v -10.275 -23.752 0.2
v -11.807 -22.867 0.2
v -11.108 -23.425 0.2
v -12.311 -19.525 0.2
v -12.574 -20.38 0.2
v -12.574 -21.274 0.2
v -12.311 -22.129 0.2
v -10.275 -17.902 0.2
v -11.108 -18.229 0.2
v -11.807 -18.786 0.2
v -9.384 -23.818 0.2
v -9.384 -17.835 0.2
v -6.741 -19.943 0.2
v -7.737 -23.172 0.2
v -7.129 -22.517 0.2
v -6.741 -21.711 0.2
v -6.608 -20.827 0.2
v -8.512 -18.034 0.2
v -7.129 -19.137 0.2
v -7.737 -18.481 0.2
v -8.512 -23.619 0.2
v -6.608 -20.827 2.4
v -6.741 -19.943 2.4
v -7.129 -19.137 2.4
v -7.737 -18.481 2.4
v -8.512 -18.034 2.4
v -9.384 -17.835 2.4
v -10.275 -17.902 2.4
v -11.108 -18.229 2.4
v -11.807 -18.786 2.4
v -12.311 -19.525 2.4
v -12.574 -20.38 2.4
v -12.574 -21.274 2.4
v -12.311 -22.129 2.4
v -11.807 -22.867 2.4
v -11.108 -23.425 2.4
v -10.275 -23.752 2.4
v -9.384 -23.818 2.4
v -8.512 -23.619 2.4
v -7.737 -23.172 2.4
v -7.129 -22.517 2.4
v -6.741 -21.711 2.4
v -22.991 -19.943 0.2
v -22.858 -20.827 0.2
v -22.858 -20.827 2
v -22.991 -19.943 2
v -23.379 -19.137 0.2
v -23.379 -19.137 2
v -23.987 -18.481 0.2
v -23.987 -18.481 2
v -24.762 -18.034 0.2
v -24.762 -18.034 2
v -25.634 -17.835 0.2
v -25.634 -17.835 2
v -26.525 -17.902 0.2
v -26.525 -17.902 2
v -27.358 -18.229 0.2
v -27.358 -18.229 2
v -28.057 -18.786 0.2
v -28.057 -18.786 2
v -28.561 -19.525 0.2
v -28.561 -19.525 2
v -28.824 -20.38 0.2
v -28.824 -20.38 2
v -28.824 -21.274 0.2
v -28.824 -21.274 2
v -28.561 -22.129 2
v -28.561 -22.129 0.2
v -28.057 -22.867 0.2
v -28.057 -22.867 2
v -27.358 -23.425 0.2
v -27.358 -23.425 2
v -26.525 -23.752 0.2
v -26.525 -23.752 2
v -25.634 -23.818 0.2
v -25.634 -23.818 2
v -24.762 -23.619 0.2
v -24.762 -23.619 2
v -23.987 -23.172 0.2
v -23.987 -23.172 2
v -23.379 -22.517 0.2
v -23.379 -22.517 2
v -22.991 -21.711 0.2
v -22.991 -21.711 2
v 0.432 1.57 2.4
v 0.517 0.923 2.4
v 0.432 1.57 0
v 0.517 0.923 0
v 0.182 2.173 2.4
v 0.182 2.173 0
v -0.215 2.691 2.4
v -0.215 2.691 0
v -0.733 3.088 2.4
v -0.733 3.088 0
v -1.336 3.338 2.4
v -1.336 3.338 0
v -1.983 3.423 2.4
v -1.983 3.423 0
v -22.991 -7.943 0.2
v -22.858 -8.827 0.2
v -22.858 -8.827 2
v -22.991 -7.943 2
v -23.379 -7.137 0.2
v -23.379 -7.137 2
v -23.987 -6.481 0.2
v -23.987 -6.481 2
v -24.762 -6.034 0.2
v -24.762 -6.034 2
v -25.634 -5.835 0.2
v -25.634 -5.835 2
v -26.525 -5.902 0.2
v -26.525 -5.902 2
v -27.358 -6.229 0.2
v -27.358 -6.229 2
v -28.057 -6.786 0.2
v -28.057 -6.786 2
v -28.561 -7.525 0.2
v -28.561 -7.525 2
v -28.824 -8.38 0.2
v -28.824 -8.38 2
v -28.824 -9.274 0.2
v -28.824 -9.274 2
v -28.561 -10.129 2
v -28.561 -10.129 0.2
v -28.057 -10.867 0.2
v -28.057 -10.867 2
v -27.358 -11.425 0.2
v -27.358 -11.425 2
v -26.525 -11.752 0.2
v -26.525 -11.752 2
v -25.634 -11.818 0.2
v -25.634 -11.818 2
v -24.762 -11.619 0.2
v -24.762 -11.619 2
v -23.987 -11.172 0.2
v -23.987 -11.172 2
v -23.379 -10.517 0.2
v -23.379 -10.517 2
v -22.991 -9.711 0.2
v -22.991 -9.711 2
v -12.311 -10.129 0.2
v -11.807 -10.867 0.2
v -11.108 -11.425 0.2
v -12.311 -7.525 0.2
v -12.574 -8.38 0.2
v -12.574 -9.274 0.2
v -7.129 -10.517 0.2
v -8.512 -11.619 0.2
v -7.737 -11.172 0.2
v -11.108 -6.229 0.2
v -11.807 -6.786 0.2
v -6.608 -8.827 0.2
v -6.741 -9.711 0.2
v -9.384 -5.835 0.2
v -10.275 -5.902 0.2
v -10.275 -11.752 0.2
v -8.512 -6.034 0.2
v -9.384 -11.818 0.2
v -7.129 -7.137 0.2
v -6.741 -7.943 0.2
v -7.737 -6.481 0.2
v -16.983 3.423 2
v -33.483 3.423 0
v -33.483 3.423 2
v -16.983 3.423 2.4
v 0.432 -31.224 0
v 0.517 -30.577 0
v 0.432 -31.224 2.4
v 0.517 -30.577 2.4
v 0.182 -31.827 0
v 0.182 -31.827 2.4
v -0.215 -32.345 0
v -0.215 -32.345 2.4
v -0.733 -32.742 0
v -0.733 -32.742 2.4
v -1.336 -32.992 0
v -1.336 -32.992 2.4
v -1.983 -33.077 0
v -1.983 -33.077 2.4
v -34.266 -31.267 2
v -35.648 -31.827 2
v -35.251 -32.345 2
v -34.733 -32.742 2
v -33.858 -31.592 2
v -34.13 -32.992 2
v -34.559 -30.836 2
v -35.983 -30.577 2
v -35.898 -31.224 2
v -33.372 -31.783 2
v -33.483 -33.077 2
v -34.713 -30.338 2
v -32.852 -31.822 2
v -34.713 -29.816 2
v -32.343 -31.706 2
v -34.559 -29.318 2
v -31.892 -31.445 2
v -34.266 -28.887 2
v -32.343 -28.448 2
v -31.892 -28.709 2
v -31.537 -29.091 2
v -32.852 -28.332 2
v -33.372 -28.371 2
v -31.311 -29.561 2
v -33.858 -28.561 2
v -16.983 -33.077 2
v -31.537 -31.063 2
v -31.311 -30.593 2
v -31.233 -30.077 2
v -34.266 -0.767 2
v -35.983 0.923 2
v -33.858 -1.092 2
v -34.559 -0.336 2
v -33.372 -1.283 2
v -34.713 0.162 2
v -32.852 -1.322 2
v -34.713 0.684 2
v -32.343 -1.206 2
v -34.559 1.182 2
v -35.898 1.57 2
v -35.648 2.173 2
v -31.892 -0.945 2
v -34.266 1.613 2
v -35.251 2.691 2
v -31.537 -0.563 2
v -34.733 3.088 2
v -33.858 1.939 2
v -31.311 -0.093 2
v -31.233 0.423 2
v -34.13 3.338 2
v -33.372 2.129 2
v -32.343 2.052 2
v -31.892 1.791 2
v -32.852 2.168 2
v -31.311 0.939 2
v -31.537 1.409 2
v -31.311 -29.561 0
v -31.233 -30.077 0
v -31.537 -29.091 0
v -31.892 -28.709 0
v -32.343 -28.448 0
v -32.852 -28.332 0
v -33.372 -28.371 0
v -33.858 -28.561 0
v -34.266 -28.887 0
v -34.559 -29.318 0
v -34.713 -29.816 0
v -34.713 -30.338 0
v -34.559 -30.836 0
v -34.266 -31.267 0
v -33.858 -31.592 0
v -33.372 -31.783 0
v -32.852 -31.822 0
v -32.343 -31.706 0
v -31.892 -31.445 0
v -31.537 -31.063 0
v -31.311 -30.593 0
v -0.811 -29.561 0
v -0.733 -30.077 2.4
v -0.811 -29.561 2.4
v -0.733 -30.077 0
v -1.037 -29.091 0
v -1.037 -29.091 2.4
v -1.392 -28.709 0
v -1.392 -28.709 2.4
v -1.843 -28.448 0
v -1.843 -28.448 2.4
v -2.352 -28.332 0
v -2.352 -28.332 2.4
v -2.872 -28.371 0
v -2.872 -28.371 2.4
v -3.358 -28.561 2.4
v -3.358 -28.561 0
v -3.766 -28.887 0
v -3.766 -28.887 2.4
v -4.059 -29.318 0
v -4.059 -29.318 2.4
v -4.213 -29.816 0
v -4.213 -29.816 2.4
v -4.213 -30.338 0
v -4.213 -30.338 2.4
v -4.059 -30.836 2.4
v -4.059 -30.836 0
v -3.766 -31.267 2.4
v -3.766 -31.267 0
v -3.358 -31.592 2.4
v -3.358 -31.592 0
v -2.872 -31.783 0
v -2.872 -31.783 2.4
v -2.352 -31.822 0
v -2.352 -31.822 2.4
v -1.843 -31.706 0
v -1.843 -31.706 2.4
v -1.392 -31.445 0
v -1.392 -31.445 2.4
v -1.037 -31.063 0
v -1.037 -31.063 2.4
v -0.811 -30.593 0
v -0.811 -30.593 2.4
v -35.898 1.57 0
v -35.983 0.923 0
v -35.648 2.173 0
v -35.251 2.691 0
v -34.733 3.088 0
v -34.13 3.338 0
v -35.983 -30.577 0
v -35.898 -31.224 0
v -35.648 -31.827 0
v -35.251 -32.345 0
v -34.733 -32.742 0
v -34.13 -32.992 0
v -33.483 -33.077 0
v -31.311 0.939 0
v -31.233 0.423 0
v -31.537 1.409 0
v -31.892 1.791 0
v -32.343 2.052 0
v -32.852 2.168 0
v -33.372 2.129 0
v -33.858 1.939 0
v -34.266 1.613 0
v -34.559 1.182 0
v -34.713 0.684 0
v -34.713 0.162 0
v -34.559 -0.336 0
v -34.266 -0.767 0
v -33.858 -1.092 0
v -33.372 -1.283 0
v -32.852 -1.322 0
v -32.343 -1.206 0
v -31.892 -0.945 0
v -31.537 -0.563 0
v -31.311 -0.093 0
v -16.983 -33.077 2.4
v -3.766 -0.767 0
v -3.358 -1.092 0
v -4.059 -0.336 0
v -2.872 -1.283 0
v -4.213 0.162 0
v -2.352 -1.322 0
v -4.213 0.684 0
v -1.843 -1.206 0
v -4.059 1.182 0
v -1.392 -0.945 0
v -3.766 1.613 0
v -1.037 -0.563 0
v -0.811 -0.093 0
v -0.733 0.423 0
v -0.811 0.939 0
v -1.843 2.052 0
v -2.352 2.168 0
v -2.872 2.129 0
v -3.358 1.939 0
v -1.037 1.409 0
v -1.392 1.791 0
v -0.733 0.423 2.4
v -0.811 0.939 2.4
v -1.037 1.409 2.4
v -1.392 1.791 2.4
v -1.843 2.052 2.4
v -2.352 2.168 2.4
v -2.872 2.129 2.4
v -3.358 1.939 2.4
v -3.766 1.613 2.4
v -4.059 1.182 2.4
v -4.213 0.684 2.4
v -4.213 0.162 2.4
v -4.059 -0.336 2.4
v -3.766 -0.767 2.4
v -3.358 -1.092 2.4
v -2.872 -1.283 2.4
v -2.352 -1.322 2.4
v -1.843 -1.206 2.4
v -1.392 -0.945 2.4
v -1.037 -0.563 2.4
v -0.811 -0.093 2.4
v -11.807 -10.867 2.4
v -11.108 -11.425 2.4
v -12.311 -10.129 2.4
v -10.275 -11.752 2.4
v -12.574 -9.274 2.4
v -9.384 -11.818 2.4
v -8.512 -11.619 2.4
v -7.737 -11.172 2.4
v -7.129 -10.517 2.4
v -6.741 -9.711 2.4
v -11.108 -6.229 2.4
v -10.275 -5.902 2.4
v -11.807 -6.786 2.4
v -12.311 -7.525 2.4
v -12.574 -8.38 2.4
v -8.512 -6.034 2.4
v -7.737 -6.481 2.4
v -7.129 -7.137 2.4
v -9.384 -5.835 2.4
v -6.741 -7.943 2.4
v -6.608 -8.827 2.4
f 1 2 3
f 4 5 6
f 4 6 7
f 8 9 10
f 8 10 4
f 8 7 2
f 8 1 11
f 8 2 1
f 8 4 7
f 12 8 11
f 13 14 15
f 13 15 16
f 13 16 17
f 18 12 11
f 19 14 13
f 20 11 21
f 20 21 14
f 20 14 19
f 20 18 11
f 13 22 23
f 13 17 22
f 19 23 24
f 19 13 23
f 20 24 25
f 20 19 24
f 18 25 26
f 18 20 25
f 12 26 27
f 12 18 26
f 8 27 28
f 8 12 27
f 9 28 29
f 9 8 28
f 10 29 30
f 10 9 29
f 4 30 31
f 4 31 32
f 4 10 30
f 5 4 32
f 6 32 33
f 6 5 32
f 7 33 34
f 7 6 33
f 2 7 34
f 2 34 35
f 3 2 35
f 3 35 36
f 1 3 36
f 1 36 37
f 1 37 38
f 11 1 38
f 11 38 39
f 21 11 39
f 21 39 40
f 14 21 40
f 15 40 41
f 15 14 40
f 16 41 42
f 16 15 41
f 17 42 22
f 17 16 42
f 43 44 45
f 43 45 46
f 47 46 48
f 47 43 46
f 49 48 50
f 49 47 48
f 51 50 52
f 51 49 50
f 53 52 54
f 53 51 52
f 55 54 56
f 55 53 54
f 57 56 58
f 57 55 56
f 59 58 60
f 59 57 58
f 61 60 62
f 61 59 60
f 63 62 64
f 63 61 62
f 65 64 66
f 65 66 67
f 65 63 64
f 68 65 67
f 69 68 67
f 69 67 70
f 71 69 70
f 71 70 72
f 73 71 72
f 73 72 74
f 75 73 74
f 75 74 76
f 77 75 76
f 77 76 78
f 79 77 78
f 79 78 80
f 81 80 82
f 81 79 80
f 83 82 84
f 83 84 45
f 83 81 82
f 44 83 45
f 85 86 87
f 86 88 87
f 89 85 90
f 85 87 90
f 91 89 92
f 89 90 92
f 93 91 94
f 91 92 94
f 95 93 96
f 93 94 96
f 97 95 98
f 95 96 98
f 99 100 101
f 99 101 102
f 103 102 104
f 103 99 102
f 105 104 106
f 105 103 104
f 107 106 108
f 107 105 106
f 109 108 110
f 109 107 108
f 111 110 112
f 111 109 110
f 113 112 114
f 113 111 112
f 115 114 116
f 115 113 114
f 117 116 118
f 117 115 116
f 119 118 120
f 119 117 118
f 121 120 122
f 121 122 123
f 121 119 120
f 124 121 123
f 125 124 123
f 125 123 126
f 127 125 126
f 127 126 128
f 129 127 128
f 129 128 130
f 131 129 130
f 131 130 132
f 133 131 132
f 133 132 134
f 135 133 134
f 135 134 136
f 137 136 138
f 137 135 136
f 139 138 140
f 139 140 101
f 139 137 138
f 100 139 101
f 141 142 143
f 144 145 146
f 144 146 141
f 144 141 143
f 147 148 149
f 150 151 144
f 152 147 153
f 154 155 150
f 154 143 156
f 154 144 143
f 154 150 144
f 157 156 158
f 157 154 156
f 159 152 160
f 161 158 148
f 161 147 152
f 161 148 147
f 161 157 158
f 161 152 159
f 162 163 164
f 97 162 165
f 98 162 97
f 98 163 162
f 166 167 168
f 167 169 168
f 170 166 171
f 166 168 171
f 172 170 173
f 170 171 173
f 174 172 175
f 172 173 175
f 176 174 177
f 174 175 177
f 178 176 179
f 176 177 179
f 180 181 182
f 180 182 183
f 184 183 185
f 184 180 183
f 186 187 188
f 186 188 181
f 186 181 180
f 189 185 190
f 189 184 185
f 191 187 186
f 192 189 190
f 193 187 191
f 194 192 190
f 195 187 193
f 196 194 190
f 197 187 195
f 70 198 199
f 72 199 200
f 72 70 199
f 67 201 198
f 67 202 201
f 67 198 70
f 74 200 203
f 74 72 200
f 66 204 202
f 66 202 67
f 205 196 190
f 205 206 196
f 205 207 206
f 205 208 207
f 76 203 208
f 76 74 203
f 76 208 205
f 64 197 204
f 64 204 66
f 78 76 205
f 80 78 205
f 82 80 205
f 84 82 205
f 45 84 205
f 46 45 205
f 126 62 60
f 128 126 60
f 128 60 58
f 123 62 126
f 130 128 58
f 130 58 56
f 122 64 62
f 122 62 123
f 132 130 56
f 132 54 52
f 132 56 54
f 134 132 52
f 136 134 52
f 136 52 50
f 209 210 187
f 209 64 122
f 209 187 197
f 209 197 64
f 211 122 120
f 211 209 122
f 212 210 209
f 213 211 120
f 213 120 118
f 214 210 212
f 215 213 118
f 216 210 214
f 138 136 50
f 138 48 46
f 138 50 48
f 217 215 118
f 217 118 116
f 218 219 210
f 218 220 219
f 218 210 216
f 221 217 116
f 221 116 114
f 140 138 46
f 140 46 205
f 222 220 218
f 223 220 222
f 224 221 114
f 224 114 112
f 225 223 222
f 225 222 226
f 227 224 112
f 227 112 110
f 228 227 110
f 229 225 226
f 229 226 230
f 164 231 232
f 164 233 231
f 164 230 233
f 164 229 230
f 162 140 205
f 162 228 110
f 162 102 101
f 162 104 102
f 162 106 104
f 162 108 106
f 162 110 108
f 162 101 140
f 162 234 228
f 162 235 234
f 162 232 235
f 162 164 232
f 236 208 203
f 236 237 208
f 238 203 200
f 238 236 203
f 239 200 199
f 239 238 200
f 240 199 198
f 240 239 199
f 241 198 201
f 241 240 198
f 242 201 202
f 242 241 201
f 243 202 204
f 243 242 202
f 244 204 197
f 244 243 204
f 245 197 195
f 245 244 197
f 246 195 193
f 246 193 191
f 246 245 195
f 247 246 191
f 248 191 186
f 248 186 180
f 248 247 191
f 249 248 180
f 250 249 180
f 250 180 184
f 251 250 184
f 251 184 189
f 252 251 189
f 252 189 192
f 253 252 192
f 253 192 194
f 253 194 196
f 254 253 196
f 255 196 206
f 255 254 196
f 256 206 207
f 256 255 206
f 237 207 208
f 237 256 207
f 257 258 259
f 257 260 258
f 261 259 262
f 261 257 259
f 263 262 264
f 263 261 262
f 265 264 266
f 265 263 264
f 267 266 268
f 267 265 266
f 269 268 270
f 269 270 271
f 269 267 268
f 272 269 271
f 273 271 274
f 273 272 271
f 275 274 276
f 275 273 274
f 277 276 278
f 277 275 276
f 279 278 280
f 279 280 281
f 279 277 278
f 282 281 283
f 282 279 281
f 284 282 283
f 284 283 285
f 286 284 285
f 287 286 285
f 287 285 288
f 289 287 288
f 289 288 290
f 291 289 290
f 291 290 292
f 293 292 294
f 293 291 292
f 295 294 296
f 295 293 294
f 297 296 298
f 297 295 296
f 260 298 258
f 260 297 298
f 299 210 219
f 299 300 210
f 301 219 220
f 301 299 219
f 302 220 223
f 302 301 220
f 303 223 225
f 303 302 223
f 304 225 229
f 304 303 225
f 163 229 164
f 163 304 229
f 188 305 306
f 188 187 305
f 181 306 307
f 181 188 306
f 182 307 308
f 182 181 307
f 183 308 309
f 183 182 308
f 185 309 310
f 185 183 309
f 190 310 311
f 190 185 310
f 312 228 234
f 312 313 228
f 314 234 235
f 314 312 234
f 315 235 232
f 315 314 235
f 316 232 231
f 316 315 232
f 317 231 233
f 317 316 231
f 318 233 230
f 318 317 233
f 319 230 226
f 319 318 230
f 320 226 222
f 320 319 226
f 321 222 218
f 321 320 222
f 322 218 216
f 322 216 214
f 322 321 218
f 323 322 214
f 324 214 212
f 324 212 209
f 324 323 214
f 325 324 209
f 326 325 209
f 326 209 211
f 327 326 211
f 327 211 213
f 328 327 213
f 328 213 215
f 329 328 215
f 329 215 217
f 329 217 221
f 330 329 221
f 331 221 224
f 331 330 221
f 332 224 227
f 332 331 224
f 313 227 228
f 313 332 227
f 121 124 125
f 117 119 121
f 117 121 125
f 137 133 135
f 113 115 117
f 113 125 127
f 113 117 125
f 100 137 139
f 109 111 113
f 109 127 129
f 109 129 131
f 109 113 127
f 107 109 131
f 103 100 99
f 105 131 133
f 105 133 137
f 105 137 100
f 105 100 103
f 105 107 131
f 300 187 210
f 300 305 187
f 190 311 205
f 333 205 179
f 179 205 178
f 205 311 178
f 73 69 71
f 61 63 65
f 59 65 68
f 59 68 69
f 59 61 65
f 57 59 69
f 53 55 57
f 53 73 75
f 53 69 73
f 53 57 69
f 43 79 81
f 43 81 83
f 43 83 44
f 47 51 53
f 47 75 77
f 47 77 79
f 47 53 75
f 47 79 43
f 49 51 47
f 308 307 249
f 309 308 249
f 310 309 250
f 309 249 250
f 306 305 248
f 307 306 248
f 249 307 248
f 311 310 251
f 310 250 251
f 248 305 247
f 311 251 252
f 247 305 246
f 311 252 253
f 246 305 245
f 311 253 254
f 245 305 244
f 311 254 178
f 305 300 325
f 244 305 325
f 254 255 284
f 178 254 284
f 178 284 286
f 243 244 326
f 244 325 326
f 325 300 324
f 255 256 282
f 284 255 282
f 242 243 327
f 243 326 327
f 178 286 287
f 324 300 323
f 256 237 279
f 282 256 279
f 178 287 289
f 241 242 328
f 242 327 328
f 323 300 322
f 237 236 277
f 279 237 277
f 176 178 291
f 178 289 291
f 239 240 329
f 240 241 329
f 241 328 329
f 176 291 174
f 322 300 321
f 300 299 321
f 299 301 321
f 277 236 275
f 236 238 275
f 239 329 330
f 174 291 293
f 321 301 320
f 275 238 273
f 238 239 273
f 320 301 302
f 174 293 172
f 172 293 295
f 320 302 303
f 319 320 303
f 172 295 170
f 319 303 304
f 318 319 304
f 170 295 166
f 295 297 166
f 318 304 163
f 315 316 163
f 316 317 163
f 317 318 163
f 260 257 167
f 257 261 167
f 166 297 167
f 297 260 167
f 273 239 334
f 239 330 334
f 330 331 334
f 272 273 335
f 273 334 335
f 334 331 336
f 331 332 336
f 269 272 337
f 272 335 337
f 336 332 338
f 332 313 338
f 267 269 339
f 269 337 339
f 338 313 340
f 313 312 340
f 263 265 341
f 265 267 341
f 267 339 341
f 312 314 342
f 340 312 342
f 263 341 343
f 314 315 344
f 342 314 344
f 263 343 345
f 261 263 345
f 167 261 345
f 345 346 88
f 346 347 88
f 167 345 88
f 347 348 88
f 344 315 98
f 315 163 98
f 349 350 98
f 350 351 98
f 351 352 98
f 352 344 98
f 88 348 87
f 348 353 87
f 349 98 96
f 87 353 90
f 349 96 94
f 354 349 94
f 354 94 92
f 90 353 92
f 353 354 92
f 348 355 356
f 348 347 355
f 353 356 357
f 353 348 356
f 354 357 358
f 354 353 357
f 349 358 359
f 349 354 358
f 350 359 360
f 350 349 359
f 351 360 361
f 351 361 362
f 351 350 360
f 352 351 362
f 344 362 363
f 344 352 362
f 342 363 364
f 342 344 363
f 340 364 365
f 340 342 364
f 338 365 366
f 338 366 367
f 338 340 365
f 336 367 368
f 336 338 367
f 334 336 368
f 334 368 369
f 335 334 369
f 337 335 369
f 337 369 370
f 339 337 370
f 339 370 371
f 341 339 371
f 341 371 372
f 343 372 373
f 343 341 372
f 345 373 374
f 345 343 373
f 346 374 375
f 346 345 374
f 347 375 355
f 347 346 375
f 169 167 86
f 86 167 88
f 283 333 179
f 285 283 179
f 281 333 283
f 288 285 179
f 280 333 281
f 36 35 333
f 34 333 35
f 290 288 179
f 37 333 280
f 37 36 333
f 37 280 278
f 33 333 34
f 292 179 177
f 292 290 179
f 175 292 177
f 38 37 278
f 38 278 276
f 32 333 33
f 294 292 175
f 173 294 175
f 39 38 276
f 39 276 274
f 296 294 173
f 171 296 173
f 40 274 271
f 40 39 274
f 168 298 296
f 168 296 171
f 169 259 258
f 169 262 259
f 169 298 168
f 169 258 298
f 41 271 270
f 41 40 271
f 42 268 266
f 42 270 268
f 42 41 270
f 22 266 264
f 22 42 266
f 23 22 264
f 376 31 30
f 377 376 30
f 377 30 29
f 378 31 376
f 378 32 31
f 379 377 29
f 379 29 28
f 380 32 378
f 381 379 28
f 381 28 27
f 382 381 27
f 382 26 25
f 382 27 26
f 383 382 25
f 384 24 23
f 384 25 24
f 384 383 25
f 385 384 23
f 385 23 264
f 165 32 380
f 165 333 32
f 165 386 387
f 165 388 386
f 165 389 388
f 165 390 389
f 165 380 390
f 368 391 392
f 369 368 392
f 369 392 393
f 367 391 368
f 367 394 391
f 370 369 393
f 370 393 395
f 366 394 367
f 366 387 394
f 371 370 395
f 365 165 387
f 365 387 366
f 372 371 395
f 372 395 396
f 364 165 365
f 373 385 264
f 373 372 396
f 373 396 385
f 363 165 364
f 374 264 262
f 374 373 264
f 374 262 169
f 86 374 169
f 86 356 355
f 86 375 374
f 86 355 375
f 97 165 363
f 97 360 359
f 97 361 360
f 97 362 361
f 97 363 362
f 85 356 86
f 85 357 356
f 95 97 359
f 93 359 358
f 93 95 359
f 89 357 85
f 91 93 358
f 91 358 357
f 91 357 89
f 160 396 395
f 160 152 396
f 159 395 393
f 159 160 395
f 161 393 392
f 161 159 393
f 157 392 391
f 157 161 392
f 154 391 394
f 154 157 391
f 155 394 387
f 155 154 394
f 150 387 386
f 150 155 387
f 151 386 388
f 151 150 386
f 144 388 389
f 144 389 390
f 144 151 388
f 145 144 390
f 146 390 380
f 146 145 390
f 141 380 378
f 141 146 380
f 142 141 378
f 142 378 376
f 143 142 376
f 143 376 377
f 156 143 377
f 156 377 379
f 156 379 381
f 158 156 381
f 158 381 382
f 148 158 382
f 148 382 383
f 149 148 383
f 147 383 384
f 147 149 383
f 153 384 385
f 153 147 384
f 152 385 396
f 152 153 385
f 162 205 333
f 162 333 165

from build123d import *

# Parameters (mm, degrees)
F0_W     = 36.5
F0_H     = 36.5
F0_R     = 1.75
F1_DEPTH = 0.2
F2_W     = 36.5
F2_H     = 36.5
F2_R     = 1.75
F2_R_2   = 3
F3_DEPTH = 1.8
F4_W     = 17.5
F4_H     = 36.5
F4_R     = 1.75
F4_R_2   = 3
F5_DEPTH = 0.4
F6_R     = 2.5


with BuildPart() as f1:
    # F0 (on Top) → F1 (new body)
    with BuildSketch(Plane.XY):
        with Locations((-17.7327652574, -14.8268600106)):
            Rectangle(F0_W, F0_H)
        with Locations((-32.9827652574, -30.0768600106)):
            Circle(F0_R, mode=Mode.SUBTRACT)
        with Locations((-2.4827652574, -30.0768600106)):
            Circle(F0_R, mode=Mode.SUBTRACT)
        with Locations((-32.9827652574, 0.4231399894)):
            Circle(F0_R, mode=Mode.SUBTRACT)
        with Locations((-2.4827652574, 0.4231399894)):
            Circle(F0_R, mode=Mode.SUBTRACT)
    extrude(amount=F1_DEPTH)

    # F2 (on face) → F3 (join)
    with BuildSketch(Plane.XY.offset(0.2)):
        with Locations((-17.7327652574, -14.8268600106)):
            Rectangle(F2_W, F2_H)
        with Locations((-32.9827652574, -30.0768600106)):
            Circle(F2_R, mode=Mode.SUBTRACT)
        with Locations((-25.8577652574, -20.8268600106)):
            Circle(F2_R_2, mode=Mode.SUBTRACT)
        with Locations((-2.4827652574, -30.0768600106)):
            Circle(F2_R, mode=Mode.SUBTRACT)
        with Locations((-9.6077652574, -20.8268600106)):
            Circle(F2_R_2, mode=Mode.SUBTRACT)
        with Locations((-25.8577652574, -8.8268600106)):
            Circle(F2_R_2, mode=Mode.SUBTRACT)
        with Locations((-32.9827652574, 0.4231399894)):
            Circle(F2_R, mode=Mode.SUBTRACT)
        with Locations((-9.6077652574, -8.8268600106)):
            Circle(F2_R_2, mode=Mode.SUBTRACT)
        with Locations((-2.4827652574, 0.4231399894)):
            Circle(F2_R, mode=Mode.SUBTRACT)
    extrude(amount=F3_DEPTH)

    # F4 (on face) → F5 (join)
    with BuildSketch(Plane.XY.offset(2)):
        with Locations((-8.2327652574, -14.8268600106)):
            Rectangle(F4_W, F4_H)
        with Locations((-2.4827652574, -30.0768600106)):
            Circle(F4_R, mode=Mode.SUBTRACT)
        with Locations((-9.6077652574, -20.8268600106)):
            Circle(F4_R_2, mode=Mode.SUBTRACT)
        with Locations((-9.6077652574, -8.8268600106)):
            Circle(F4_R_2, mode=Mode.SUBTRACT)
        with Locations((-2.4827652574, 0.4231399894)):
            Circle(F4_R, mode=Mode.SUBTRACT)
    extrude(amount=F5_DEPTH)

    # F6
    f6_edges = [f1.edges().sort_by_distance(p)[0] for p in [
        (-35.982765, 3.42314, 1),
        (-35.982765, -33.07686, 1),
        (0.517235, -33.07686, 1.2),
        (0.517235, 3.42314, 1.2),
    ]]
    fillet(f6_edges, radius=F6_R)


solid = f1.part
